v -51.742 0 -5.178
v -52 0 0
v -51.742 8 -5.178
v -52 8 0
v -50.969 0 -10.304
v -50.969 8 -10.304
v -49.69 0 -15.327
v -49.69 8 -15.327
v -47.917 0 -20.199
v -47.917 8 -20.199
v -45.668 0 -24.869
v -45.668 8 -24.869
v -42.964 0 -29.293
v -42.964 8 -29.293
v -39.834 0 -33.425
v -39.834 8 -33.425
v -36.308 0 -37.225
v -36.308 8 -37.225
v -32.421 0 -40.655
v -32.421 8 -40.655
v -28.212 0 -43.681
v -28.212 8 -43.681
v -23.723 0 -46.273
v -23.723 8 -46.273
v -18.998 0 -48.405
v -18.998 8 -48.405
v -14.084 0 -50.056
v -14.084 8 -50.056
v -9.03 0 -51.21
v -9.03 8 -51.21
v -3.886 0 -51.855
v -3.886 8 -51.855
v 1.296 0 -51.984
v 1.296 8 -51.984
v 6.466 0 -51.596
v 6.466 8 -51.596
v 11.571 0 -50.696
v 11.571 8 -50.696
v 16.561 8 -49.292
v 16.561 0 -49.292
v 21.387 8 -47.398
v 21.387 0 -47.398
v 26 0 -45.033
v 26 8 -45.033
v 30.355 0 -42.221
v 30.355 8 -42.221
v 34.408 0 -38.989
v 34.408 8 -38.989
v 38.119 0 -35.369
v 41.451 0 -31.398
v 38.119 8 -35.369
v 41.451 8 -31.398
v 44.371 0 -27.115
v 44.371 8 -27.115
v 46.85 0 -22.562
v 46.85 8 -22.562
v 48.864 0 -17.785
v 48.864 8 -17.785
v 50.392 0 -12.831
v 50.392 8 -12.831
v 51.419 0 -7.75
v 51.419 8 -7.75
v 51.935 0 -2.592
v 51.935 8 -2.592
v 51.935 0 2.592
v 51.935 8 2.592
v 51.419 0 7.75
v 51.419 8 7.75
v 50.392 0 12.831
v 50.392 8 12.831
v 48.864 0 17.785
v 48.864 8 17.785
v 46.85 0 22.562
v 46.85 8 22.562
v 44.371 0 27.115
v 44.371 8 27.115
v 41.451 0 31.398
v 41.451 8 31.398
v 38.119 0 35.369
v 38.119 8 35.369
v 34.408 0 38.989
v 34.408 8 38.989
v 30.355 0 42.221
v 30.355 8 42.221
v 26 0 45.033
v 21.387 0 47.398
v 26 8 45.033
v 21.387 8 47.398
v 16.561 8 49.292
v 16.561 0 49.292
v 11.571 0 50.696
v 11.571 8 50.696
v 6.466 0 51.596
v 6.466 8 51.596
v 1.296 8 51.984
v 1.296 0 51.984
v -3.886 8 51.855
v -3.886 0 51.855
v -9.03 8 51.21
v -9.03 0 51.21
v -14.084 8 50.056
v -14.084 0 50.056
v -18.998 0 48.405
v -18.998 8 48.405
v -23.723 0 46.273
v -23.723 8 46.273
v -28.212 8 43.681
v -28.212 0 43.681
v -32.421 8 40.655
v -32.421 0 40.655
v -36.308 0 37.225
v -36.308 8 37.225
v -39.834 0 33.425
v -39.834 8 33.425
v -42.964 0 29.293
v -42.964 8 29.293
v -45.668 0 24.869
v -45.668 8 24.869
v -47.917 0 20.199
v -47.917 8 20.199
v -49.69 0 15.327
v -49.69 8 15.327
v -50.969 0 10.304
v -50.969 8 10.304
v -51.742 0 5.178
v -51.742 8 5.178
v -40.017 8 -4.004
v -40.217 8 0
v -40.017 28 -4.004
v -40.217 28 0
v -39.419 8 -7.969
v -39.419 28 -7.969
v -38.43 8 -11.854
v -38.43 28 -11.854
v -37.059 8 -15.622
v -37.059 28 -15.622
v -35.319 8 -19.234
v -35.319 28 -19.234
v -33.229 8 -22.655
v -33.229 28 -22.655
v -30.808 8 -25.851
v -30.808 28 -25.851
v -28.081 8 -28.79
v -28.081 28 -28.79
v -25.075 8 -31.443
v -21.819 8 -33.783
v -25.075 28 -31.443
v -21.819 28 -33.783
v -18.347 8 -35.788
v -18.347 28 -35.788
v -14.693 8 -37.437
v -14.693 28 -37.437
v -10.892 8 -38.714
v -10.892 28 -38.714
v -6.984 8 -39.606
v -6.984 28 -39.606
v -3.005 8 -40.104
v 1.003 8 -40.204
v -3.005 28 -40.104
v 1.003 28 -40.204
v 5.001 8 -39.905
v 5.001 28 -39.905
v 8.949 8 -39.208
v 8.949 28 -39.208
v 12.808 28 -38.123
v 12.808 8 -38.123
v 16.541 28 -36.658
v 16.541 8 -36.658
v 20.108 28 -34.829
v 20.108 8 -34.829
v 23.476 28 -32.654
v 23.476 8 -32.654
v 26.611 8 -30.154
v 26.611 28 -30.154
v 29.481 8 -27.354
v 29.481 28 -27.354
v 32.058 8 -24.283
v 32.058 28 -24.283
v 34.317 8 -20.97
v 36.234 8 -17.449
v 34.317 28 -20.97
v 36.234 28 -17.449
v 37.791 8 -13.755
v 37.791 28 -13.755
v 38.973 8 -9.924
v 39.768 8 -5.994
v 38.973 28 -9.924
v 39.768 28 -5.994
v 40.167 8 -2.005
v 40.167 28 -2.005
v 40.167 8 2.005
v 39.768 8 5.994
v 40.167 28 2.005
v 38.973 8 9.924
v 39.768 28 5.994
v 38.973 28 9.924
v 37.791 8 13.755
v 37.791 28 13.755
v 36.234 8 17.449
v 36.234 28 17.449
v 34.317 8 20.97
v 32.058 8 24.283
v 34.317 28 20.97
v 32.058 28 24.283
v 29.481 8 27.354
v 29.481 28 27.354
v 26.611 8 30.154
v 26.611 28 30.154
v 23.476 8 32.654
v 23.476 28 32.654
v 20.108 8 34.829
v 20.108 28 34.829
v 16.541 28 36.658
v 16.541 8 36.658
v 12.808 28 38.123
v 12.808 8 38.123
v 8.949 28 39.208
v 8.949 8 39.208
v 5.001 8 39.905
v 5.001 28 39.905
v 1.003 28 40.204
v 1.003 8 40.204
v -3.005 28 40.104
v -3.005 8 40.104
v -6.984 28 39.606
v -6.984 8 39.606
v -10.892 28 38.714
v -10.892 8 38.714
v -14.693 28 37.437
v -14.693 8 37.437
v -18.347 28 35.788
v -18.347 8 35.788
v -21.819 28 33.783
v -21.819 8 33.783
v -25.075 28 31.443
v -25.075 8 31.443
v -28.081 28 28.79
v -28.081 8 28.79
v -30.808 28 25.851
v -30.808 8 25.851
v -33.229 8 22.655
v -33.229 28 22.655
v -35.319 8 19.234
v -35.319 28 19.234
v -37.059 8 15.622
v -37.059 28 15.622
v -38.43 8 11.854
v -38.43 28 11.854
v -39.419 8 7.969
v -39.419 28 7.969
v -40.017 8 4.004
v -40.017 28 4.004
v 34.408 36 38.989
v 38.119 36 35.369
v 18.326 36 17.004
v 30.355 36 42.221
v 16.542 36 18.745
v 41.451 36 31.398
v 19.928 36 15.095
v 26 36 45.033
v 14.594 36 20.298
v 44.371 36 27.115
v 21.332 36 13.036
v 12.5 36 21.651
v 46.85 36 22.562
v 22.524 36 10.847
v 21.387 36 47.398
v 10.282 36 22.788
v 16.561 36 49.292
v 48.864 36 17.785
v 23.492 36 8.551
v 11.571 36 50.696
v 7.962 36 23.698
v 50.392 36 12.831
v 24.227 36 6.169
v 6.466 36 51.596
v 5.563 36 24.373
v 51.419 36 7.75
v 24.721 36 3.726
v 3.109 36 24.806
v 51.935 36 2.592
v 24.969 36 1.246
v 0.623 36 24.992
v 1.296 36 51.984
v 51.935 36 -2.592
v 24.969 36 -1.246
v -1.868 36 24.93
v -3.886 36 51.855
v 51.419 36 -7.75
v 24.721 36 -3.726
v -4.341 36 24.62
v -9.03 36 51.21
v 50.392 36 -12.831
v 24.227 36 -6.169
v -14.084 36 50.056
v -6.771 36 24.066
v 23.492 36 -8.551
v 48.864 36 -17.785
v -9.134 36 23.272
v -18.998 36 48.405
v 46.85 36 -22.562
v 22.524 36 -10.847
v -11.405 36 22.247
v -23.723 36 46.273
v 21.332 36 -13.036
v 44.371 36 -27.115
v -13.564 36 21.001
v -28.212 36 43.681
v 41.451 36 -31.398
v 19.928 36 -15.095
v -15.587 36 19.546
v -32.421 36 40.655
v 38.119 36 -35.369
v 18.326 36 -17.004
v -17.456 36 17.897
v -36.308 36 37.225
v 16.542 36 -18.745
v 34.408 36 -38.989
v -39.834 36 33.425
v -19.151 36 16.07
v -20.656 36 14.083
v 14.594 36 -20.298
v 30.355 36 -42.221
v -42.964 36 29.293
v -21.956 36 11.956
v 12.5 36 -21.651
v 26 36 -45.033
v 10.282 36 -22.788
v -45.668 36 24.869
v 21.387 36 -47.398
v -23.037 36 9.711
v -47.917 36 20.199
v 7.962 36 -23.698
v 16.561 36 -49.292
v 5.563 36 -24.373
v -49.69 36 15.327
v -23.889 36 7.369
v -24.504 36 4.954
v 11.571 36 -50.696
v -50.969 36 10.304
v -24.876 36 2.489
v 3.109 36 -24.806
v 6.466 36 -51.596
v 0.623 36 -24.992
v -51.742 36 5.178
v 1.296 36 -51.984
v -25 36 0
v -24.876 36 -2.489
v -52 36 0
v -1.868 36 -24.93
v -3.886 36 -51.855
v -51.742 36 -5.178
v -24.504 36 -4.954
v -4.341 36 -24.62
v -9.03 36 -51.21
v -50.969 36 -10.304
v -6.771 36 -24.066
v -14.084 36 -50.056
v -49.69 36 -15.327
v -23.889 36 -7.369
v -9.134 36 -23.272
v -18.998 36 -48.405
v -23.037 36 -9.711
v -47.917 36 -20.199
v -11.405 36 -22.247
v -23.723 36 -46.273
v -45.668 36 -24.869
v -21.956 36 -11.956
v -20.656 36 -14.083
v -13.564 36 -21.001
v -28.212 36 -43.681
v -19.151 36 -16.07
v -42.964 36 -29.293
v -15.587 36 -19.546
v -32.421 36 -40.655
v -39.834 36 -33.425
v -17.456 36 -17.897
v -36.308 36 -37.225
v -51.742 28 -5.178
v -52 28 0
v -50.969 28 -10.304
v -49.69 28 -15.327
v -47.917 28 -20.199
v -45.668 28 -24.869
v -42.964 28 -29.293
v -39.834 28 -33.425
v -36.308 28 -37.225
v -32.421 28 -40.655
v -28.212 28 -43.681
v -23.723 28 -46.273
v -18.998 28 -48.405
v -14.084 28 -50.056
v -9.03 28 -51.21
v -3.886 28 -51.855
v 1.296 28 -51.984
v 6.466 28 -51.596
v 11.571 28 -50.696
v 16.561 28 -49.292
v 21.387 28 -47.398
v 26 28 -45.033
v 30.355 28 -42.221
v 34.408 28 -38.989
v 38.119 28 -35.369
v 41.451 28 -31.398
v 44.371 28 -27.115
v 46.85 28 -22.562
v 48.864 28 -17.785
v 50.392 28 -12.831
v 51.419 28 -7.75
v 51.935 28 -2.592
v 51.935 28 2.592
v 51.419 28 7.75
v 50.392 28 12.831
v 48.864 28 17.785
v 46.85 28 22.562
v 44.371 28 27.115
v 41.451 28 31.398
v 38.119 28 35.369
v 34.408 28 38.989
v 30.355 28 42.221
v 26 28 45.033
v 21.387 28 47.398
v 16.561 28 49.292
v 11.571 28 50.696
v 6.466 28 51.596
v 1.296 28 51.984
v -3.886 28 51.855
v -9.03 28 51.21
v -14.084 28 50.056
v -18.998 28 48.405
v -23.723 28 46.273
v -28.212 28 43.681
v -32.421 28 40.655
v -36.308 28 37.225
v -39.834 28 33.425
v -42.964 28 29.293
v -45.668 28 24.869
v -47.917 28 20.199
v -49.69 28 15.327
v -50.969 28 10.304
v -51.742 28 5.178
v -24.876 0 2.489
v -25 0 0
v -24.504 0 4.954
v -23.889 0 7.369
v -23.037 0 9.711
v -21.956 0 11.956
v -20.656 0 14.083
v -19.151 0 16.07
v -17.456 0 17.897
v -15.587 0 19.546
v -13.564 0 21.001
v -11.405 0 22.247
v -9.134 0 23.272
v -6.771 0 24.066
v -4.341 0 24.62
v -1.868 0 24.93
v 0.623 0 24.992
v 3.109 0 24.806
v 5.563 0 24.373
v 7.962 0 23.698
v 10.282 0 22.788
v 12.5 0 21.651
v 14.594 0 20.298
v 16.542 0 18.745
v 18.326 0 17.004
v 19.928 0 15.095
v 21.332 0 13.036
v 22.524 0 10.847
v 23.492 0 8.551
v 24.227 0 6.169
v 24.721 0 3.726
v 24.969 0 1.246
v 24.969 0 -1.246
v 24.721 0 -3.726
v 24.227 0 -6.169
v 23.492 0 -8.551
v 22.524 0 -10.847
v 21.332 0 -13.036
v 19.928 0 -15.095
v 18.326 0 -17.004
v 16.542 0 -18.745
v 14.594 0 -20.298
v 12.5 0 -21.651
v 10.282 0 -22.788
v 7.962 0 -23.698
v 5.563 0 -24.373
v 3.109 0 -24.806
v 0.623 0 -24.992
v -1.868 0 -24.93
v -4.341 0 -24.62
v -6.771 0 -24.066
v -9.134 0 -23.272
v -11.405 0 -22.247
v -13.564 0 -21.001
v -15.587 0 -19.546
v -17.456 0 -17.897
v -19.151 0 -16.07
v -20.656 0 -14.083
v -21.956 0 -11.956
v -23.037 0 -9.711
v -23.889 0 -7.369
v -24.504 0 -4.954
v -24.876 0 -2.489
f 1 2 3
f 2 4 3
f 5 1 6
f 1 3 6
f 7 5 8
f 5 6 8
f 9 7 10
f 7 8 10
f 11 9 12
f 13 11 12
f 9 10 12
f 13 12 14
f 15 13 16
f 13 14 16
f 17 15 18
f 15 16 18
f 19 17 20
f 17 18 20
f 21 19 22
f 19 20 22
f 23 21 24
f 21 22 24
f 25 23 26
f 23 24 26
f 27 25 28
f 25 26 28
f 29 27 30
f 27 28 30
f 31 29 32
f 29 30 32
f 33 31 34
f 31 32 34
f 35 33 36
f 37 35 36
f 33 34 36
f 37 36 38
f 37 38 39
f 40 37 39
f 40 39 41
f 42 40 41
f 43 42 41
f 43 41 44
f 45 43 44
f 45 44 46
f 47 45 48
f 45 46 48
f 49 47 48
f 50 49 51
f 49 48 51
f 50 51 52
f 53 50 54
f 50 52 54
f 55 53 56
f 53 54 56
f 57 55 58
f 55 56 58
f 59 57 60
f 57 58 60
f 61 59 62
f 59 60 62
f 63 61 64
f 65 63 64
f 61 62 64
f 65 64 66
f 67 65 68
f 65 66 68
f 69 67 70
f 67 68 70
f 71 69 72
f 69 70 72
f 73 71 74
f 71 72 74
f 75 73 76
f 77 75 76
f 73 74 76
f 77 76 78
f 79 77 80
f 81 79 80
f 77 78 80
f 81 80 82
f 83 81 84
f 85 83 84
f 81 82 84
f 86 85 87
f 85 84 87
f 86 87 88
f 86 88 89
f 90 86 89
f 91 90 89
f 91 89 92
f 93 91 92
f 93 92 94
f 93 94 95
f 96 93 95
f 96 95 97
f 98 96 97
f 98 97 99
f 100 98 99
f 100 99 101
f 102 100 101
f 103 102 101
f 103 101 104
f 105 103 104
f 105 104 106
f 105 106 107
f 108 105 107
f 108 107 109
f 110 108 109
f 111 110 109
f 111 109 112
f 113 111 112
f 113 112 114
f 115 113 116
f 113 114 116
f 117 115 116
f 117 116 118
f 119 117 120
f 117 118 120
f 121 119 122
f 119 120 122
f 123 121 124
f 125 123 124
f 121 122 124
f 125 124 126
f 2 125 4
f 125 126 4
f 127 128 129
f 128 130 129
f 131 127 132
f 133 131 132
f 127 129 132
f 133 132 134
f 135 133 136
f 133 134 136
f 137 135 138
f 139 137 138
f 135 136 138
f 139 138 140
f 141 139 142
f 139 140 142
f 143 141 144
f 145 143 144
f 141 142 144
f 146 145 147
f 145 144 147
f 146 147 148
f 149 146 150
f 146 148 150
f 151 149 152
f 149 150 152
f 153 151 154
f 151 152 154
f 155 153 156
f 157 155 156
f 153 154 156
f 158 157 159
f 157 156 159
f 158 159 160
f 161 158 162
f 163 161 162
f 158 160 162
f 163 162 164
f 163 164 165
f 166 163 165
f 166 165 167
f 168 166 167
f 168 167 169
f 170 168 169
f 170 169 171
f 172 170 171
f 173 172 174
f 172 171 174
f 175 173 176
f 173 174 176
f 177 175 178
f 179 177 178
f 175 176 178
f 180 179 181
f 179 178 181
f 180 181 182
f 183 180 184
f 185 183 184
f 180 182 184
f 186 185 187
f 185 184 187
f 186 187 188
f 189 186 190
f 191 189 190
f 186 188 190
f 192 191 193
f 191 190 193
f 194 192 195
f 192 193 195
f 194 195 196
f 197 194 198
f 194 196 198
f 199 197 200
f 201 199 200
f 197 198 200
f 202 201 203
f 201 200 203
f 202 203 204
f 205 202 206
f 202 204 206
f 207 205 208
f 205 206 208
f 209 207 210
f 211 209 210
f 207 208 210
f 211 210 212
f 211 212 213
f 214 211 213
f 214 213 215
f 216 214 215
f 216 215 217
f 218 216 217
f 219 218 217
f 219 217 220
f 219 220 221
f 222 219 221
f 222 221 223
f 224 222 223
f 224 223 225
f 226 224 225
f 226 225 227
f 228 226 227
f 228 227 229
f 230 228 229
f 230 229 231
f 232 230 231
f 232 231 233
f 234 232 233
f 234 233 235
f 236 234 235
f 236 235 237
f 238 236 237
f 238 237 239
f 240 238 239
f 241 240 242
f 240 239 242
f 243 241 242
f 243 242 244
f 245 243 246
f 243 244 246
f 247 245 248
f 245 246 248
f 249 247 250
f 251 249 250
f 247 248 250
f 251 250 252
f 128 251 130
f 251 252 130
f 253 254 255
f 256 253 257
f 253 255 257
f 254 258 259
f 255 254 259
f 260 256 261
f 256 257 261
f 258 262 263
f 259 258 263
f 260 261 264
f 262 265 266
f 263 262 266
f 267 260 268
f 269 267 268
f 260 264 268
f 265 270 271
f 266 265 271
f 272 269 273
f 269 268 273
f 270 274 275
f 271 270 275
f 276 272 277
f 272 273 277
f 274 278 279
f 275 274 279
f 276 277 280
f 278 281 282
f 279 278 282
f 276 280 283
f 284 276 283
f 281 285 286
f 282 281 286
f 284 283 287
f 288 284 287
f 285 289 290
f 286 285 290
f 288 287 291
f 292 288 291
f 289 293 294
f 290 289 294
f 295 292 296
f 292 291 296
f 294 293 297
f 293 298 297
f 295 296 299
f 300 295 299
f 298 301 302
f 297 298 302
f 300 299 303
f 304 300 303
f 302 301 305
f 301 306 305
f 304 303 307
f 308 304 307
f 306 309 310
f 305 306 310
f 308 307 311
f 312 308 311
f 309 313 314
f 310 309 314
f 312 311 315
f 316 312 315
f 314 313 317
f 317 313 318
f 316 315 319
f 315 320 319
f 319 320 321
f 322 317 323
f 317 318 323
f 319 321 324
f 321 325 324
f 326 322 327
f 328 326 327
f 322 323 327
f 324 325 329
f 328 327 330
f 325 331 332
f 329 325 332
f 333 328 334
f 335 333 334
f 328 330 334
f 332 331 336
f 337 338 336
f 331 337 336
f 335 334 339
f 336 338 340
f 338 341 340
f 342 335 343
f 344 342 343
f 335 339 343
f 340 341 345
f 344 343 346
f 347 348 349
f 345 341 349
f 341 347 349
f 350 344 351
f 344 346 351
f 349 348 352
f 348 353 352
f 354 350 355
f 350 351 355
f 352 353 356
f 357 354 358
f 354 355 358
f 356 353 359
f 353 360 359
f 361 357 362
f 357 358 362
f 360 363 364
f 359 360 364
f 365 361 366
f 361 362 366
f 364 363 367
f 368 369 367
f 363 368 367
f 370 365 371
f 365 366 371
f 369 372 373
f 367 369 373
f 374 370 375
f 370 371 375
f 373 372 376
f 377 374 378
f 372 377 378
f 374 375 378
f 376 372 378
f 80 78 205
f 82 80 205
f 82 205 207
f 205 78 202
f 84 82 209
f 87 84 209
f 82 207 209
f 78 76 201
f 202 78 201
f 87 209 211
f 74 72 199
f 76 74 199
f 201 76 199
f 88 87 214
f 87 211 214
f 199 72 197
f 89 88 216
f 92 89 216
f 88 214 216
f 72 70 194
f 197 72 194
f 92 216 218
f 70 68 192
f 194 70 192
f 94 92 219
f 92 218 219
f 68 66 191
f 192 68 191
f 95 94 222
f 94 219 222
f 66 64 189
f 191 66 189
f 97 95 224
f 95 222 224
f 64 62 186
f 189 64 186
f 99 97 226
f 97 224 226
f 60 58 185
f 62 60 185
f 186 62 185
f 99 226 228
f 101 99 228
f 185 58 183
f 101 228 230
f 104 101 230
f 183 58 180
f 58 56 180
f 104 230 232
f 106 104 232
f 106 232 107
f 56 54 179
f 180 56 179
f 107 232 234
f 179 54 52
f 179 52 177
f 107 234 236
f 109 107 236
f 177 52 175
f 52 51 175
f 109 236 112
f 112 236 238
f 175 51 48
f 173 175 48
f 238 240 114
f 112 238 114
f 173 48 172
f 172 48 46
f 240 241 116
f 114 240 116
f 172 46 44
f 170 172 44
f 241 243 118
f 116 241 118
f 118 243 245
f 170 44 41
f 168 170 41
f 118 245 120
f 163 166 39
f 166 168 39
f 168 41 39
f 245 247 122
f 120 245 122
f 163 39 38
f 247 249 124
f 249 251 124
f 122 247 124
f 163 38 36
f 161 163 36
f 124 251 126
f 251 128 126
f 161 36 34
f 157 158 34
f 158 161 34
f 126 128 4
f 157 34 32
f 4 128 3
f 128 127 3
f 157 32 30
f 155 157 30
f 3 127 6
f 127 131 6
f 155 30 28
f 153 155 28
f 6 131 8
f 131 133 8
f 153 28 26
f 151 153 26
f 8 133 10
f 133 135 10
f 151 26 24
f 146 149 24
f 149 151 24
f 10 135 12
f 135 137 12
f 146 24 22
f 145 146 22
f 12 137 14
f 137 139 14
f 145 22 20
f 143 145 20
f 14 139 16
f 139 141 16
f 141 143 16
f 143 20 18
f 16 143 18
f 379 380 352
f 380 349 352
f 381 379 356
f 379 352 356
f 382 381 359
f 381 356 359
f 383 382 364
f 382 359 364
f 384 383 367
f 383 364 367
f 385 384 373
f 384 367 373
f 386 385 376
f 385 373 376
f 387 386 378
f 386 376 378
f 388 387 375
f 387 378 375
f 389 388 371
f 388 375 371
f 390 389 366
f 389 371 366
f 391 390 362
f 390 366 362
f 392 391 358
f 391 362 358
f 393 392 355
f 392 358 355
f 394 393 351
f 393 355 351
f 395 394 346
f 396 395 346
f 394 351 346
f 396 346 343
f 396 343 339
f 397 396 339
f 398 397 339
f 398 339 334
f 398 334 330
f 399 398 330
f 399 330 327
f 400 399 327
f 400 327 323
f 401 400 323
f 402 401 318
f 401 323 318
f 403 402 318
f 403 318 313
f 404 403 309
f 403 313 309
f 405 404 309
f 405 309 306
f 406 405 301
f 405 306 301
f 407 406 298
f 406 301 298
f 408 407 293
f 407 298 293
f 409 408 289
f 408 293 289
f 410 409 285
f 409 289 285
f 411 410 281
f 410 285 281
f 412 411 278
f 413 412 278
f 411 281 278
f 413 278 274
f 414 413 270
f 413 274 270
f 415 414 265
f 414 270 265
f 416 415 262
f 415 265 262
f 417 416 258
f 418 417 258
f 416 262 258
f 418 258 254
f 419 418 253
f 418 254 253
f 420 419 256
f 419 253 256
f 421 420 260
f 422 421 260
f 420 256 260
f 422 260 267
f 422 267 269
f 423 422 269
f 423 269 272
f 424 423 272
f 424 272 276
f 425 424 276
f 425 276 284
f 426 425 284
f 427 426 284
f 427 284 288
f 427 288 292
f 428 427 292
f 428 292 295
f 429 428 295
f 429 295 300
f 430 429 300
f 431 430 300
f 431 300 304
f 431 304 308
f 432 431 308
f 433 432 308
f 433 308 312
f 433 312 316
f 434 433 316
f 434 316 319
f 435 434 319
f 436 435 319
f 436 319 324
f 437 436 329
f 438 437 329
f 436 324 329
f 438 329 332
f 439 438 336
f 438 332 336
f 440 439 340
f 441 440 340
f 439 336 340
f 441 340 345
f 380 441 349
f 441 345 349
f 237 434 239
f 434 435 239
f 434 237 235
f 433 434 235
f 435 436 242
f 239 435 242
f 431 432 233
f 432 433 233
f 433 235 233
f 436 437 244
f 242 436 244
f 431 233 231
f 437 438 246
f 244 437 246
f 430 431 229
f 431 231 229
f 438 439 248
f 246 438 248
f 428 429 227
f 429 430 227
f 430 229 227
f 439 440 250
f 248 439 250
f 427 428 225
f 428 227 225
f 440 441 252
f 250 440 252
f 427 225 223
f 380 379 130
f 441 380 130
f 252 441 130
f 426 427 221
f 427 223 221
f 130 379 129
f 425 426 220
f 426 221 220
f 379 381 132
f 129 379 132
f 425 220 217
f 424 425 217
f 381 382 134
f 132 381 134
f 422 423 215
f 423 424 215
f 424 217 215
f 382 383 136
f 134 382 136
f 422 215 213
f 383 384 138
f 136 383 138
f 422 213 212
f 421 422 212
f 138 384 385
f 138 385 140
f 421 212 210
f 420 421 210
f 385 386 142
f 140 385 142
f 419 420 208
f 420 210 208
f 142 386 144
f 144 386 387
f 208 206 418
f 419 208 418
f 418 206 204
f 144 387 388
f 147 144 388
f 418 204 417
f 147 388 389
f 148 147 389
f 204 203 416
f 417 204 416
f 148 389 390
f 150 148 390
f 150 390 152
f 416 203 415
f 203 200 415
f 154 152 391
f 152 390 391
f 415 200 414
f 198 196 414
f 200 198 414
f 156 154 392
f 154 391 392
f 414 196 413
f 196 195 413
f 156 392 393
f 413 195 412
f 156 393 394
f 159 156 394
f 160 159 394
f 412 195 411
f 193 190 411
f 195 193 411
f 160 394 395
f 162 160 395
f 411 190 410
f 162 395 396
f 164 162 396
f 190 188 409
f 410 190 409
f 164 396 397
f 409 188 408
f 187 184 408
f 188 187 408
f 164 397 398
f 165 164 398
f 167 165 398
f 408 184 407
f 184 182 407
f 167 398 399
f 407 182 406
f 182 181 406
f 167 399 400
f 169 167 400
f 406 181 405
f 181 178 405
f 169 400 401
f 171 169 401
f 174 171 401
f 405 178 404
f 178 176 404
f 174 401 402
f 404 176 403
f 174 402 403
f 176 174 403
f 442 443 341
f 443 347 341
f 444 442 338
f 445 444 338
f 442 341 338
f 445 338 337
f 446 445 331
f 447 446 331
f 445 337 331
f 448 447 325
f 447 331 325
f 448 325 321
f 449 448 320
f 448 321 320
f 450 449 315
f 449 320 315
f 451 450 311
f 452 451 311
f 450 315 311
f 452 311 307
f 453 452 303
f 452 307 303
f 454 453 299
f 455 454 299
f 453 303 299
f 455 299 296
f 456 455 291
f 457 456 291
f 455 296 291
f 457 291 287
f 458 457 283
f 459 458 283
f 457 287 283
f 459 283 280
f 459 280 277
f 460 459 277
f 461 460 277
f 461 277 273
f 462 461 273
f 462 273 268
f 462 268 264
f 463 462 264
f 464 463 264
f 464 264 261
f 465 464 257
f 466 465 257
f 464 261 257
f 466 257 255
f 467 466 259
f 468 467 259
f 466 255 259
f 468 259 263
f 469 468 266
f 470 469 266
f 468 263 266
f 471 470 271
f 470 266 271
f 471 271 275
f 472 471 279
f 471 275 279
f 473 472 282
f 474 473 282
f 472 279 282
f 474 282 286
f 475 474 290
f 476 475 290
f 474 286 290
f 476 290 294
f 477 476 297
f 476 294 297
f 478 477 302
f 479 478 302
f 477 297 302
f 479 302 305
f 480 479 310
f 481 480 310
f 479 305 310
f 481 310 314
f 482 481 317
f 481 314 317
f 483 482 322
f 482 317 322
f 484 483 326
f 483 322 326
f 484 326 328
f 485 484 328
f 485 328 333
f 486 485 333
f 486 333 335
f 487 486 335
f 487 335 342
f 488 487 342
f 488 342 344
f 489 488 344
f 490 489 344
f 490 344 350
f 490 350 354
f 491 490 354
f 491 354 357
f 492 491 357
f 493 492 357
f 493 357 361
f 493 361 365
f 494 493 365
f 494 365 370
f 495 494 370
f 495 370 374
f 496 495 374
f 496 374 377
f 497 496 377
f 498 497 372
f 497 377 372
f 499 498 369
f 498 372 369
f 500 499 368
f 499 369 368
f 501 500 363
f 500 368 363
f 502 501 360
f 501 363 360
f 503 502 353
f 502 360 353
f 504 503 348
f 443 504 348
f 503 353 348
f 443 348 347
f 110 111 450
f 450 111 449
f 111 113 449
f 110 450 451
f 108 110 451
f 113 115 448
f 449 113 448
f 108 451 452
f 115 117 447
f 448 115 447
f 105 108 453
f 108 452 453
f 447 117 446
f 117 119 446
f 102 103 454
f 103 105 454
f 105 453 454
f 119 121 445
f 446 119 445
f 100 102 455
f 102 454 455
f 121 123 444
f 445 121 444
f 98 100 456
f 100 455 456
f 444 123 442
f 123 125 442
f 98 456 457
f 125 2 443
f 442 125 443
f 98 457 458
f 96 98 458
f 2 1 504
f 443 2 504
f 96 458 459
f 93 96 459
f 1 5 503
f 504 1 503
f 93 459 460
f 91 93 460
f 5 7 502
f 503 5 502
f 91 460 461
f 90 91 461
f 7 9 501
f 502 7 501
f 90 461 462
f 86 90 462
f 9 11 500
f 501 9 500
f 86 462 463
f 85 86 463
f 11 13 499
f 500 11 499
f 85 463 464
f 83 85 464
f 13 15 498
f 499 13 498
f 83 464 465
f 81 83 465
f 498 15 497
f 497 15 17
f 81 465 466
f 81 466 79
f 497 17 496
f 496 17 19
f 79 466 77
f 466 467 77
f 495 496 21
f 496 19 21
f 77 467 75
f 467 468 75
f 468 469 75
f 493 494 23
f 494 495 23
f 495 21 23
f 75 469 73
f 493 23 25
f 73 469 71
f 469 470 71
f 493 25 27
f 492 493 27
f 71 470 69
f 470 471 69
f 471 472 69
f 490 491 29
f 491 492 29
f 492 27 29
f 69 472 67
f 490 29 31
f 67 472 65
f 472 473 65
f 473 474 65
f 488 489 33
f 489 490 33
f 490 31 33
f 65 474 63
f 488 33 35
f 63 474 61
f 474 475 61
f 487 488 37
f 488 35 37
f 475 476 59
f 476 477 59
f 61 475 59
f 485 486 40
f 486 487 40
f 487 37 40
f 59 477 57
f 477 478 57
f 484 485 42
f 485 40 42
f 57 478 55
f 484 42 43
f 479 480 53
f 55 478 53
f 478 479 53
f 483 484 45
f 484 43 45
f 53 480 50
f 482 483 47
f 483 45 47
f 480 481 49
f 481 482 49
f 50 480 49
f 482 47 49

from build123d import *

# Parameters (mm, degrees)
SKETCH3_R          = 25
CUT_EXTRUDE1_DEPTH = 10
SKETCH5_R          = 25
CUT_EXTRUDE2_DEPTH = 36


with BuildPart() as part:
    # Sketch2 → Revolve1 (revolve)
    with BuildSketch(Plane.XY, mode=Mode.PRIVATE) as revolve1_sk:
        Polygon((0, 0), (52, 0), (52, 8), (40.216748768, 8), (40.216748768, 28), (52, 28), (52, 36), (0, 36), align=None)
    revolve(revolve1_sk.sketch.rotate(Axis((0, 36, 0), (0, -1, 0)), 180), axis=Axis((0, 36, 0), (0, -1, 0)))

    # Sketch3 → Cut-Extrude1 (cut)
    with BuildSketch(Plane(origin=(0, 36, 0), x_dir=(1, 0, 0), z_dir=(0, 1, 0))):
        with Locations(Location((0, 0, 0), (0, 0, 180))):
            Circle(SKETCH3_R)
    extrude(amount=-CUT_EXTRUDE1_DEPTH, mode=Mode.SUBTRACT)

    # Sketch5 → Cut-Extrude2 (cut)
    with BuildSketch(Plane(origin=(0, 26, 0), x_dir=(1, 0, 0), z_dir=(0, 1, 0))):
        with Locations(Location((0, 0, 0), (0, 0, 180))):
            Circle(SKETCH5_R)
    extrude(amount=-CUT_EXTRUDE2_DEPTH, mode=Mode.SUBTRACT)


solid = part.part
